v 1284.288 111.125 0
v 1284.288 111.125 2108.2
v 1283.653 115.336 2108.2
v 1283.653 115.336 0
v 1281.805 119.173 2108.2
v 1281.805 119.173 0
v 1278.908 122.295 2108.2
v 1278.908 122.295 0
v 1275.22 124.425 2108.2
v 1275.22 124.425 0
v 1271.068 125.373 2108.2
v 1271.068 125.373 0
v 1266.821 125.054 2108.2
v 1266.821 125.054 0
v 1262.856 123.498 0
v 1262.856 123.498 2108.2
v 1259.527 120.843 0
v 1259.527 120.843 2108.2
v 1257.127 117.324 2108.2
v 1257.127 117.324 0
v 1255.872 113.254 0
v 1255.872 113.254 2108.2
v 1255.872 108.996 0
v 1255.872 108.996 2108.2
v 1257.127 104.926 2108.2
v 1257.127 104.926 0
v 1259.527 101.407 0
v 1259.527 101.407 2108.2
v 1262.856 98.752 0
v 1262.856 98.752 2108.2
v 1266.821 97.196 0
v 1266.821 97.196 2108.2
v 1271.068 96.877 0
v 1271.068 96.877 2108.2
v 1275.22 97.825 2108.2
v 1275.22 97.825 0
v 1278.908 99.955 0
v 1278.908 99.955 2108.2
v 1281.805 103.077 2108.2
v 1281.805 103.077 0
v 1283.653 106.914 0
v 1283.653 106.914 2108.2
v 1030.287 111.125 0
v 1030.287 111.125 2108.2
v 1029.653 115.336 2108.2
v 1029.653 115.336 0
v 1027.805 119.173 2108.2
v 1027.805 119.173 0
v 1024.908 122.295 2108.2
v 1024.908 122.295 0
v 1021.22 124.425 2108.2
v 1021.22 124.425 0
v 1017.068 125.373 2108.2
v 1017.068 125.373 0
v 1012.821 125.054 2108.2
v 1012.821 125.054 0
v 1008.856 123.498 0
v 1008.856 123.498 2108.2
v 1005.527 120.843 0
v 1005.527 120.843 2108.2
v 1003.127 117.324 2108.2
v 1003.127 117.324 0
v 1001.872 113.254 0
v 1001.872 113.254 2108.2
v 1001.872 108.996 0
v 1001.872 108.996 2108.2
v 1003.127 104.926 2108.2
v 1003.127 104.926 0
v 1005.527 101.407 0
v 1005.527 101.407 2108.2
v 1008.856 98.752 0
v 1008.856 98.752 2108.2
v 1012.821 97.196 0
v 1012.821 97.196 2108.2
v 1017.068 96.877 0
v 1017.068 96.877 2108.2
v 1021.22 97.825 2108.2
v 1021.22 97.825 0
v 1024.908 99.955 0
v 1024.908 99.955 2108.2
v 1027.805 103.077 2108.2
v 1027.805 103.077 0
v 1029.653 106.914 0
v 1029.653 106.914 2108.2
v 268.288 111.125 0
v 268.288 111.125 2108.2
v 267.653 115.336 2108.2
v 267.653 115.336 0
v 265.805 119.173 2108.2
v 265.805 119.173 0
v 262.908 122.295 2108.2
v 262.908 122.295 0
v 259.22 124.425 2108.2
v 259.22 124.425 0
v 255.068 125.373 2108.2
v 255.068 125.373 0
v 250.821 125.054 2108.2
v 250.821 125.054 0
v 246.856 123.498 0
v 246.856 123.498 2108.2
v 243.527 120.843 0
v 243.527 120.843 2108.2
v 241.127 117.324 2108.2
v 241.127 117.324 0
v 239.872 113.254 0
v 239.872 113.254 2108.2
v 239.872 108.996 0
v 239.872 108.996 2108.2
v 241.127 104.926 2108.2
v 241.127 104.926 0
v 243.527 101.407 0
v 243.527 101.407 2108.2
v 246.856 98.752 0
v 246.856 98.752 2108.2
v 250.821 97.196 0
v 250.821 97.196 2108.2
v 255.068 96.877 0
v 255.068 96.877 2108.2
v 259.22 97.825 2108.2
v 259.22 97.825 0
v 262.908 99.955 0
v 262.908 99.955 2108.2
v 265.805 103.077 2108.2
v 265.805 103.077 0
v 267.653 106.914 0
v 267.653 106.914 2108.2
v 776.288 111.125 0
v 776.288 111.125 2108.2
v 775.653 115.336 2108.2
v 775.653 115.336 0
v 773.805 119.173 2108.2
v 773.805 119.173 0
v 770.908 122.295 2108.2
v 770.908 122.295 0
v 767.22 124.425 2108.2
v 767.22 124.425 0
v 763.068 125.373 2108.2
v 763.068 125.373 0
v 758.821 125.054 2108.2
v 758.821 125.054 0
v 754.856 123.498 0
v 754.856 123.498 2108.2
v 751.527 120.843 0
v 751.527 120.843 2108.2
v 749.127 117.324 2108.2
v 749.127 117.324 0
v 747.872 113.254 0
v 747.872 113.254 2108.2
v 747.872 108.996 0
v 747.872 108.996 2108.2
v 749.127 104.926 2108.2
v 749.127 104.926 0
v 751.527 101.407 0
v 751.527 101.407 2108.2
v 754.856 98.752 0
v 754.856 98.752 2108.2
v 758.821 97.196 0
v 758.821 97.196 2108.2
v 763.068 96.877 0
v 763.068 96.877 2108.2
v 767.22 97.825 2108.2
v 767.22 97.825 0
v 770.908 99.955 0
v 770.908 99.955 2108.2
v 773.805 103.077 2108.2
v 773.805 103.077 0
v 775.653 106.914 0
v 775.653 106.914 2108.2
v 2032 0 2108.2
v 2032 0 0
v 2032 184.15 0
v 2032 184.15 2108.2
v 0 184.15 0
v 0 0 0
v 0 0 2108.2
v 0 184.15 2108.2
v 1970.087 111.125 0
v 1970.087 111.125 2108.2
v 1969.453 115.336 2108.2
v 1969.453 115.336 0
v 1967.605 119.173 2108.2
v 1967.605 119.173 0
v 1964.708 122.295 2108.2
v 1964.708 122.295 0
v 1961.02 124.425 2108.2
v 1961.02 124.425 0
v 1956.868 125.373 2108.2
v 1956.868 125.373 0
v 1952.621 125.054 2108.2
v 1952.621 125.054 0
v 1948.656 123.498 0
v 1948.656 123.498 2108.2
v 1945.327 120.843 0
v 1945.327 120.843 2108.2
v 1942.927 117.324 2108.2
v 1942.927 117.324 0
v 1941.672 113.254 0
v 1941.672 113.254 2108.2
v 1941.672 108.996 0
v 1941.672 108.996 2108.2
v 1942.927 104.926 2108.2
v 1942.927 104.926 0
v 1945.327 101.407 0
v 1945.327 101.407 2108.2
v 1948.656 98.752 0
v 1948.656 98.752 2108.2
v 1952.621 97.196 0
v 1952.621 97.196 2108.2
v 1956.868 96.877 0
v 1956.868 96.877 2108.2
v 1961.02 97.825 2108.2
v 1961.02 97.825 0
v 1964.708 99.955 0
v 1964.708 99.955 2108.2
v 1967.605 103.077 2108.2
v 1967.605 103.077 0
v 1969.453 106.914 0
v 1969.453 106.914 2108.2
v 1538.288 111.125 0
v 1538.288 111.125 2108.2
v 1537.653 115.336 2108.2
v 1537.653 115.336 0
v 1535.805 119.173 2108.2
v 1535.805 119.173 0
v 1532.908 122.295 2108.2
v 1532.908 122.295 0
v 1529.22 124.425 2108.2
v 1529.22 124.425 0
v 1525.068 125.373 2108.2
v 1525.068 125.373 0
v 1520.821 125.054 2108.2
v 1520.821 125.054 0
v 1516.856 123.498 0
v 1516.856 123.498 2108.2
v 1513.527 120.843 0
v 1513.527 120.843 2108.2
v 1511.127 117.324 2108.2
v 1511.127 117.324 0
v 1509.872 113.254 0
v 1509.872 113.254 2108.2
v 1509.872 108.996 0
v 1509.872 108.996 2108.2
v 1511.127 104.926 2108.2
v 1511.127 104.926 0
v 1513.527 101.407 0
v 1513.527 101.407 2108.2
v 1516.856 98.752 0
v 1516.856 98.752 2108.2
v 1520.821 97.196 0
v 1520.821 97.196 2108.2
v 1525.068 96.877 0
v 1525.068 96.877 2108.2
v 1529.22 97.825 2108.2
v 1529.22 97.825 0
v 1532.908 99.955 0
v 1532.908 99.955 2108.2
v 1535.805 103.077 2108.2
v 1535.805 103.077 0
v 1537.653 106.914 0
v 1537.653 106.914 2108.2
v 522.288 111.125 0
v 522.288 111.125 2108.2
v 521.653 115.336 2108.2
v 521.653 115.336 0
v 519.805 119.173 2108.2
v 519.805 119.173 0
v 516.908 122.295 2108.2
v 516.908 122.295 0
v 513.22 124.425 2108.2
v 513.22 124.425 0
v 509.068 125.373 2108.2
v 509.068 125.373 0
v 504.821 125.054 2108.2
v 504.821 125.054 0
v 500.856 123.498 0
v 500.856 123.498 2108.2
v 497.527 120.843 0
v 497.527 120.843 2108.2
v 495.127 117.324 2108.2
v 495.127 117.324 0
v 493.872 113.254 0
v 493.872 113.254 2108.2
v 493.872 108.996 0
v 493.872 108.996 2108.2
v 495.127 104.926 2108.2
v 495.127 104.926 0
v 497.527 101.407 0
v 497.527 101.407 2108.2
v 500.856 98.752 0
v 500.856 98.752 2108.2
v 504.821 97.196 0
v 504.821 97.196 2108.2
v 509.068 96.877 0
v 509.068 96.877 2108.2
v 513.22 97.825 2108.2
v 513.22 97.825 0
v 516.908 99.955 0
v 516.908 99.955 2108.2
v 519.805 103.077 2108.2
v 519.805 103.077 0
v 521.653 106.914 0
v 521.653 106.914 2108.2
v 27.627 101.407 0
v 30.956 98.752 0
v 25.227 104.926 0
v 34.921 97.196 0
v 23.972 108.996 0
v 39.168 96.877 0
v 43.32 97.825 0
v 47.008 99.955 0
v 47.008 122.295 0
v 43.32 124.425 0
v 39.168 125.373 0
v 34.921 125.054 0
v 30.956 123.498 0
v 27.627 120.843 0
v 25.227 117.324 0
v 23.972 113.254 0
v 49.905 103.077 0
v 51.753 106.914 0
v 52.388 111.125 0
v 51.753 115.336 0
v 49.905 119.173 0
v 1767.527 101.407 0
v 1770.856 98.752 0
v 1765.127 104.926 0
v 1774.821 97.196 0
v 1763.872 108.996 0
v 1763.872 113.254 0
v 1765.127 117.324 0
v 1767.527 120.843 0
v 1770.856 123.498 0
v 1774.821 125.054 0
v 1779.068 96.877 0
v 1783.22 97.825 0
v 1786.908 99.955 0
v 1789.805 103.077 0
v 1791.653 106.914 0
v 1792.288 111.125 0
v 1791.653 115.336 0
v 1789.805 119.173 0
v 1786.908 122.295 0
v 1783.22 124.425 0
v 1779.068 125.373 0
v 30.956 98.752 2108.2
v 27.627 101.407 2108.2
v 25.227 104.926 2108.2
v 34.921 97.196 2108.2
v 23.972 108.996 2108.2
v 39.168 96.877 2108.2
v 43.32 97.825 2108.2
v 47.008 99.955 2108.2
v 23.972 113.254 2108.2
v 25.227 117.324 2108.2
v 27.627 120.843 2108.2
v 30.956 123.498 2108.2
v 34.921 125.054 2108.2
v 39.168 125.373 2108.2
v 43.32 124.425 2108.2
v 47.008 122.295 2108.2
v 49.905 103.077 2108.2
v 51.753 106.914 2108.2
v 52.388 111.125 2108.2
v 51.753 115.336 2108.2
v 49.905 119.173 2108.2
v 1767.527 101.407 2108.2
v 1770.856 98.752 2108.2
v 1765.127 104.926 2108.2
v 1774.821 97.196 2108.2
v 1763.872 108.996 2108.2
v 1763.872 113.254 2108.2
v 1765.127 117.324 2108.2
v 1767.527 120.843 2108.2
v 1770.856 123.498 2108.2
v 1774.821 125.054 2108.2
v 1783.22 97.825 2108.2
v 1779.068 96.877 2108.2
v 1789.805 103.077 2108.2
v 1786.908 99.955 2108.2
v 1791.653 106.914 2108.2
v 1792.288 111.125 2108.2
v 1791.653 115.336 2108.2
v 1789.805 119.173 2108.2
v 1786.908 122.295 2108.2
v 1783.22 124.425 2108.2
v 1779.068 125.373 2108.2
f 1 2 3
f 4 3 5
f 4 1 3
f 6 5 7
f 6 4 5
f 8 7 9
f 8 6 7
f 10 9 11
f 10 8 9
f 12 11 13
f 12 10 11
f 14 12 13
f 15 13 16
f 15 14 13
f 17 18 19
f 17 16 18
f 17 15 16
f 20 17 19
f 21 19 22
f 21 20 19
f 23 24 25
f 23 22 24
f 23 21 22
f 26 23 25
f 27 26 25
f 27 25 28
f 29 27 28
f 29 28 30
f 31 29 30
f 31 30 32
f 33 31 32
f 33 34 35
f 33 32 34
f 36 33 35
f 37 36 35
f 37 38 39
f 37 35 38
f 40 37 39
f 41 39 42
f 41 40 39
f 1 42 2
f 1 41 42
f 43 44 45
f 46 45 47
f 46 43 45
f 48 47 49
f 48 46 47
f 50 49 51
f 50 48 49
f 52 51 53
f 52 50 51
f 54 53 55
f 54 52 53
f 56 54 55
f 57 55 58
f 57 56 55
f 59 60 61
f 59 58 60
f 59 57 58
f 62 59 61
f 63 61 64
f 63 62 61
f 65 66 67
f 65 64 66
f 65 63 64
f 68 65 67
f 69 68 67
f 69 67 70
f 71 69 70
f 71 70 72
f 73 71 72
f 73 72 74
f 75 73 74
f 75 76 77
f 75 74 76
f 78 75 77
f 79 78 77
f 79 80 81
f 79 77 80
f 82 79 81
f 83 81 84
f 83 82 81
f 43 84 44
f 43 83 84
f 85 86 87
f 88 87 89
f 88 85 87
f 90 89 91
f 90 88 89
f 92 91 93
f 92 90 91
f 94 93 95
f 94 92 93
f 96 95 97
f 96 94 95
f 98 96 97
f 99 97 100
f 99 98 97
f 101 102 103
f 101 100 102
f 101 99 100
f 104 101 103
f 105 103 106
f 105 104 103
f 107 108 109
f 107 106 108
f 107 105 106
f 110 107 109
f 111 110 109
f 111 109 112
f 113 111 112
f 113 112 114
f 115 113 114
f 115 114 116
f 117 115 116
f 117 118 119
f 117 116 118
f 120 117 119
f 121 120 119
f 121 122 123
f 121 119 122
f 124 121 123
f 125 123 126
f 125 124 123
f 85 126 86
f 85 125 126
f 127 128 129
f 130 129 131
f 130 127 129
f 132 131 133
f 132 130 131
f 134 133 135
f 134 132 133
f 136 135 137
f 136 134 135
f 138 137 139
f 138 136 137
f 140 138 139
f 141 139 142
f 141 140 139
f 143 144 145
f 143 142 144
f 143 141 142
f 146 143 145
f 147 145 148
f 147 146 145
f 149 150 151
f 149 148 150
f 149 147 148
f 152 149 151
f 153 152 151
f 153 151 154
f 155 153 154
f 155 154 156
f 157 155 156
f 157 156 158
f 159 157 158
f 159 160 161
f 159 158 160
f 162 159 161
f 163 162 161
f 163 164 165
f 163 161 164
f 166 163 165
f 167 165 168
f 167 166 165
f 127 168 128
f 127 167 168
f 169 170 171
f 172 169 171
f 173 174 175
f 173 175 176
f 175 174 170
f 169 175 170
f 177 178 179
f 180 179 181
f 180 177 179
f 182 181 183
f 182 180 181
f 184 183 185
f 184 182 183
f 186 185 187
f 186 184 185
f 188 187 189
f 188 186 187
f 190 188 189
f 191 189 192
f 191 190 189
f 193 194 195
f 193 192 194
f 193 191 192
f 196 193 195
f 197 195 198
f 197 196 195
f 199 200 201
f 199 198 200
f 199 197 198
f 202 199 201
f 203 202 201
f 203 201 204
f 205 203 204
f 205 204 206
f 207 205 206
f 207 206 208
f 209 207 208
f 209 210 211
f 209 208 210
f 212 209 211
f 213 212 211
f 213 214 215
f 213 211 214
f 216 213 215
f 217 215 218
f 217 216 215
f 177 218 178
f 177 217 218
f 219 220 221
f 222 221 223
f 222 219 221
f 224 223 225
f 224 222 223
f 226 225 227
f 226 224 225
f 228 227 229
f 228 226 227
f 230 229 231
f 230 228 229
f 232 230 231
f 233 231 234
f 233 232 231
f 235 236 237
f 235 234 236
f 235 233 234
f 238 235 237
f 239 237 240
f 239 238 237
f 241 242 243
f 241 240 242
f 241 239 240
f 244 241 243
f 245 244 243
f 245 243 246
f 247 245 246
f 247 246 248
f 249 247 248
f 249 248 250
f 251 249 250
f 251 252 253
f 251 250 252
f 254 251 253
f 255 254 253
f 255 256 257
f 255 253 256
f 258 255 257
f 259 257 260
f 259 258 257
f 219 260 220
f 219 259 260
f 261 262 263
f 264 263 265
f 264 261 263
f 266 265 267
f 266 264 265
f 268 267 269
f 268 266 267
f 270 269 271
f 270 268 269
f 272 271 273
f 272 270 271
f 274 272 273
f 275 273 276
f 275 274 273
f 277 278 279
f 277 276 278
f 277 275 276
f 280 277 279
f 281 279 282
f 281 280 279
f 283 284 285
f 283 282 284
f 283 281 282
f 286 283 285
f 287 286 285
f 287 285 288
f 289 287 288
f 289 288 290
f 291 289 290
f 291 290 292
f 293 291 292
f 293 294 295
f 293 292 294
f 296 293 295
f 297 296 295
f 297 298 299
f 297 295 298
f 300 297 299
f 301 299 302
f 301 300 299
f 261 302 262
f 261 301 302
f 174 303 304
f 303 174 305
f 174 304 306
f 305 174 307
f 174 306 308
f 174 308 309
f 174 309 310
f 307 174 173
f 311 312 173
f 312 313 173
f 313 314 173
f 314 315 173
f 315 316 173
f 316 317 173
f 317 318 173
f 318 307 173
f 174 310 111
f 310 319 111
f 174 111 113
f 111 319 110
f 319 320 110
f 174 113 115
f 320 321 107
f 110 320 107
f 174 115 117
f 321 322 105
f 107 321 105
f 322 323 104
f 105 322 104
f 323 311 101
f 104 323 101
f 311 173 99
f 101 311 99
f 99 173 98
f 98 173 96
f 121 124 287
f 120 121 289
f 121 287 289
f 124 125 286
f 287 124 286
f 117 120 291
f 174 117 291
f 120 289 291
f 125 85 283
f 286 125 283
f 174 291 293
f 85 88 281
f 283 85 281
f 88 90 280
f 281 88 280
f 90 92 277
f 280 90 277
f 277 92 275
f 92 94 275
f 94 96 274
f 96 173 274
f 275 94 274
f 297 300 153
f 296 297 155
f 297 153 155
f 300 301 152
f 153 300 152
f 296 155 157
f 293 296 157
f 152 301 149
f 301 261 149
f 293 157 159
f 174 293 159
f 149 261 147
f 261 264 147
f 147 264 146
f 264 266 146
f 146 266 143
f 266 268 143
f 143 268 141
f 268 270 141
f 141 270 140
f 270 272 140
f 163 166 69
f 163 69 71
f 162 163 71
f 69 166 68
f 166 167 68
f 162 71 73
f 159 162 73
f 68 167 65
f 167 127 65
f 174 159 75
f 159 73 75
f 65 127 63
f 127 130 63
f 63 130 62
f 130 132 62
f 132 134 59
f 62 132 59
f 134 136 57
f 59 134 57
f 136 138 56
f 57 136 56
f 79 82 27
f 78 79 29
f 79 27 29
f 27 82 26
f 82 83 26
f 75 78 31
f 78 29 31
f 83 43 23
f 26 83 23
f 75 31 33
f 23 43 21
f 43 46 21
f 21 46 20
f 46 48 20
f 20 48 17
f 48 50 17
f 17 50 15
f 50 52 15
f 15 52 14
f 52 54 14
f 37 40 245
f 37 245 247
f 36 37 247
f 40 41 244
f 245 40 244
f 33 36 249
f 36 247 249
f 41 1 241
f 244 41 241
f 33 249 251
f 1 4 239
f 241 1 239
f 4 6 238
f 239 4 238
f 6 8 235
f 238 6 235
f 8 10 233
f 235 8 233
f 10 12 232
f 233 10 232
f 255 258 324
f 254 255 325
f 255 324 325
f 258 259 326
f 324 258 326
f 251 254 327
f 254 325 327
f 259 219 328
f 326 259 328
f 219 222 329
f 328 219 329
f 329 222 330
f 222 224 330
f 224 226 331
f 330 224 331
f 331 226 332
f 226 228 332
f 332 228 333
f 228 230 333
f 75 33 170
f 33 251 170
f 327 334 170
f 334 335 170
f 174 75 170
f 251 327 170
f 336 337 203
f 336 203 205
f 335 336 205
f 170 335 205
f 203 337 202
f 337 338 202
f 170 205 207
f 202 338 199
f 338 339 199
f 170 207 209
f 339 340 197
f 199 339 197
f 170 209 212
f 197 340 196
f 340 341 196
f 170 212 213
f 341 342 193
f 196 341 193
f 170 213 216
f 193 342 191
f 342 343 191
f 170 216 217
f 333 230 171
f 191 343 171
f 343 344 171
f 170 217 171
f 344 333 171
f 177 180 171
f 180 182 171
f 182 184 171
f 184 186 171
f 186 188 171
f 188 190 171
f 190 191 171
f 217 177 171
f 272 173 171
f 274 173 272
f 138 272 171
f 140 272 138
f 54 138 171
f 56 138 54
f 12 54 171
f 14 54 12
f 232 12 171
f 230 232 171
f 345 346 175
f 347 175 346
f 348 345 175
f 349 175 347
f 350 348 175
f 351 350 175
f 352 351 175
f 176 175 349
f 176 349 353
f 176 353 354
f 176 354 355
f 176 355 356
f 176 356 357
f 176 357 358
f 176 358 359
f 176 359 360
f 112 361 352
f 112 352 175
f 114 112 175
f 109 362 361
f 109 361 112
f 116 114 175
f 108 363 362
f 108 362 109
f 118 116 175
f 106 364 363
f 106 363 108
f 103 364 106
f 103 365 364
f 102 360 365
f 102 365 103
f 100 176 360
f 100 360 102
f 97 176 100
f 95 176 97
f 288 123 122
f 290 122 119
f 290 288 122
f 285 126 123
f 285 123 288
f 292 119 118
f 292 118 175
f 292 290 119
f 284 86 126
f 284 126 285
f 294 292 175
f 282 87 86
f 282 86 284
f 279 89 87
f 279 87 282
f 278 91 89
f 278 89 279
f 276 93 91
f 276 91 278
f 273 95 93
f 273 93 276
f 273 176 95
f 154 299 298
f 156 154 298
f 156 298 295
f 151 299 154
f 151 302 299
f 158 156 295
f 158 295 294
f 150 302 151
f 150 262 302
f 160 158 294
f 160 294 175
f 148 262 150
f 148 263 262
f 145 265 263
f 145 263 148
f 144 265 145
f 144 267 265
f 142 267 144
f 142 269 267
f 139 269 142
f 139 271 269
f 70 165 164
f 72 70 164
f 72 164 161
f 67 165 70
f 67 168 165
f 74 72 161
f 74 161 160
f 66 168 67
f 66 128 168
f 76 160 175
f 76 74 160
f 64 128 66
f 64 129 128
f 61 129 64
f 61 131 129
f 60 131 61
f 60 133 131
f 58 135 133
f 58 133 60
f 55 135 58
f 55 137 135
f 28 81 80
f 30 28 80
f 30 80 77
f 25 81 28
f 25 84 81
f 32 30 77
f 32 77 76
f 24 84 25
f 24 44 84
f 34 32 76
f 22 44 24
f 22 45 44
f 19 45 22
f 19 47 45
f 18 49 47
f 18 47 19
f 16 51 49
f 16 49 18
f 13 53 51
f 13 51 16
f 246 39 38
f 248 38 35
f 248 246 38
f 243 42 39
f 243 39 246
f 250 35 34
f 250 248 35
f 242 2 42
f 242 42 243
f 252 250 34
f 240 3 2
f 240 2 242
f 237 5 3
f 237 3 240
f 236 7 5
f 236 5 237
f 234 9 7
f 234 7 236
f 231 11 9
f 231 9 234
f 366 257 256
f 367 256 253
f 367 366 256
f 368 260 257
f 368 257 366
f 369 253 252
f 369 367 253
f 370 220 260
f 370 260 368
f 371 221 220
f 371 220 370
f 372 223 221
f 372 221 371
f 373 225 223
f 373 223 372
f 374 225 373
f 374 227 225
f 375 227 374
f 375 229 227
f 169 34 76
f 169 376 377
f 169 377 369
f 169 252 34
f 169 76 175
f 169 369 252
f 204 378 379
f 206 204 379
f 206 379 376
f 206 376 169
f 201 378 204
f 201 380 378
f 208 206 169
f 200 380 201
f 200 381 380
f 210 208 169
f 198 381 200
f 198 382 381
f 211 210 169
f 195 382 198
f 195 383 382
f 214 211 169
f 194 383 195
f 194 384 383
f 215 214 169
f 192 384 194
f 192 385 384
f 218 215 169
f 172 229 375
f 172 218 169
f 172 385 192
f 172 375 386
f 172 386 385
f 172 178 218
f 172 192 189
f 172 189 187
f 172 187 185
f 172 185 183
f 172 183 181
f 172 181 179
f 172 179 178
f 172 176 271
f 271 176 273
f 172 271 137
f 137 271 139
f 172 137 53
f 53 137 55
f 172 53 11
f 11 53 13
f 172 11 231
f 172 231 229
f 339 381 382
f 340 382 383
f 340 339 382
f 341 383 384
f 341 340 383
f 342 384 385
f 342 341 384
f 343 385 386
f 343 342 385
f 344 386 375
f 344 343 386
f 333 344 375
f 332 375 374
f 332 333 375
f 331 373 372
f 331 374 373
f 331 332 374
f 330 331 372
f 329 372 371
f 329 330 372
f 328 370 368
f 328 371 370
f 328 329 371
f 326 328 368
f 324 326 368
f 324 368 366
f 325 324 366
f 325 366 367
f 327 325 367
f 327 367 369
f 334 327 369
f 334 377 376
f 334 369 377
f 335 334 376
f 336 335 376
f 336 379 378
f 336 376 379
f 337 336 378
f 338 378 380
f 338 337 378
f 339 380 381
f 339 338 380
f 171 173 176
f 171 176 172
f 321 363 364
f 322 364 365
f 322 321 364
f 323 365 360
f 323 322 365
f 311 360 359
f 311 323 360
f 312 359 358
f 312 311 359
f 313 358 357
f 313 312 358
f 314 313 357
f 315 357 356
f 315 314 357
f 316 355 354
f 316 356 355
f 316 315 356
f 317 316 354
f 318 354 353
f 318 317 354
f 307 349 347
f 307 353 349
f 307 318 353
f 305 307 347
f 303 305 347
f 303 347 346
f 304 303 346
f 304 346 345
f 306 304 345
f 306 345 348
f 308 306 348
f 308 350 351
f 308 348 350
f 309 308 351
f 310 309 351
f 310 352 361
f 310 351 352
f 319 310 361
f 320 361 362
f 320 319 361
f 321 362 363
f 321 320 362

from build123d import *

# Parameters (mm, degrees)
SKETCH1_W           = 2032
SKETCH1_H           = 184.15
BOSS_EXTRUDE1_DEPTH = 2108.2
SKETCH2_R           = 14.2875
CUT_EXTRUDE1_DEPTH  = 2934.844314632


with BuildPart() as part:
    # Sketch1 → Boss-Extrude1 (new body)
    with BuildSketch(Plane.XY):
        with Locations((1016, 92.075)):
            Rectangle(SKETCH1_W, SKETCH1_H)
    extrude(amount=BOSS_EXTRUDE1_DEPTH)

    # Sketch2 → Cut-Extrude1 (cut, through all)
    with BuildSketch(Plane.XY):
        with Locations((38.1, 111.125)):
            Circle(SKETCH2_R)
        with Locations((254, 111.125)):
            Circle(SKETCH2_R)
        with Locations((508, 111.125)):
            Circle(SKETCH2_R)
        with Locations((762, 111.125)):
            Circle(SKETCH2_R)
        with Locations((1016, 111.125)):
            Circle(SKETCH2_R)
        with Locations((1270, 111.125)):
            Circle(SKETCH2_R)
        with Locations((1524, 111.125)):
            Circle(SKETCH2_R)
        with Locations((1778, 111.125)):
            Circle(SKETCH2_R)
        with Locations((1955.8, 111.125)):
            Circle(SKETCH2_R)
    extrude(amount=CUT_EXTRUDE1_DEPTH, mode=Mode.SUBTRACT)


solid = part.part
